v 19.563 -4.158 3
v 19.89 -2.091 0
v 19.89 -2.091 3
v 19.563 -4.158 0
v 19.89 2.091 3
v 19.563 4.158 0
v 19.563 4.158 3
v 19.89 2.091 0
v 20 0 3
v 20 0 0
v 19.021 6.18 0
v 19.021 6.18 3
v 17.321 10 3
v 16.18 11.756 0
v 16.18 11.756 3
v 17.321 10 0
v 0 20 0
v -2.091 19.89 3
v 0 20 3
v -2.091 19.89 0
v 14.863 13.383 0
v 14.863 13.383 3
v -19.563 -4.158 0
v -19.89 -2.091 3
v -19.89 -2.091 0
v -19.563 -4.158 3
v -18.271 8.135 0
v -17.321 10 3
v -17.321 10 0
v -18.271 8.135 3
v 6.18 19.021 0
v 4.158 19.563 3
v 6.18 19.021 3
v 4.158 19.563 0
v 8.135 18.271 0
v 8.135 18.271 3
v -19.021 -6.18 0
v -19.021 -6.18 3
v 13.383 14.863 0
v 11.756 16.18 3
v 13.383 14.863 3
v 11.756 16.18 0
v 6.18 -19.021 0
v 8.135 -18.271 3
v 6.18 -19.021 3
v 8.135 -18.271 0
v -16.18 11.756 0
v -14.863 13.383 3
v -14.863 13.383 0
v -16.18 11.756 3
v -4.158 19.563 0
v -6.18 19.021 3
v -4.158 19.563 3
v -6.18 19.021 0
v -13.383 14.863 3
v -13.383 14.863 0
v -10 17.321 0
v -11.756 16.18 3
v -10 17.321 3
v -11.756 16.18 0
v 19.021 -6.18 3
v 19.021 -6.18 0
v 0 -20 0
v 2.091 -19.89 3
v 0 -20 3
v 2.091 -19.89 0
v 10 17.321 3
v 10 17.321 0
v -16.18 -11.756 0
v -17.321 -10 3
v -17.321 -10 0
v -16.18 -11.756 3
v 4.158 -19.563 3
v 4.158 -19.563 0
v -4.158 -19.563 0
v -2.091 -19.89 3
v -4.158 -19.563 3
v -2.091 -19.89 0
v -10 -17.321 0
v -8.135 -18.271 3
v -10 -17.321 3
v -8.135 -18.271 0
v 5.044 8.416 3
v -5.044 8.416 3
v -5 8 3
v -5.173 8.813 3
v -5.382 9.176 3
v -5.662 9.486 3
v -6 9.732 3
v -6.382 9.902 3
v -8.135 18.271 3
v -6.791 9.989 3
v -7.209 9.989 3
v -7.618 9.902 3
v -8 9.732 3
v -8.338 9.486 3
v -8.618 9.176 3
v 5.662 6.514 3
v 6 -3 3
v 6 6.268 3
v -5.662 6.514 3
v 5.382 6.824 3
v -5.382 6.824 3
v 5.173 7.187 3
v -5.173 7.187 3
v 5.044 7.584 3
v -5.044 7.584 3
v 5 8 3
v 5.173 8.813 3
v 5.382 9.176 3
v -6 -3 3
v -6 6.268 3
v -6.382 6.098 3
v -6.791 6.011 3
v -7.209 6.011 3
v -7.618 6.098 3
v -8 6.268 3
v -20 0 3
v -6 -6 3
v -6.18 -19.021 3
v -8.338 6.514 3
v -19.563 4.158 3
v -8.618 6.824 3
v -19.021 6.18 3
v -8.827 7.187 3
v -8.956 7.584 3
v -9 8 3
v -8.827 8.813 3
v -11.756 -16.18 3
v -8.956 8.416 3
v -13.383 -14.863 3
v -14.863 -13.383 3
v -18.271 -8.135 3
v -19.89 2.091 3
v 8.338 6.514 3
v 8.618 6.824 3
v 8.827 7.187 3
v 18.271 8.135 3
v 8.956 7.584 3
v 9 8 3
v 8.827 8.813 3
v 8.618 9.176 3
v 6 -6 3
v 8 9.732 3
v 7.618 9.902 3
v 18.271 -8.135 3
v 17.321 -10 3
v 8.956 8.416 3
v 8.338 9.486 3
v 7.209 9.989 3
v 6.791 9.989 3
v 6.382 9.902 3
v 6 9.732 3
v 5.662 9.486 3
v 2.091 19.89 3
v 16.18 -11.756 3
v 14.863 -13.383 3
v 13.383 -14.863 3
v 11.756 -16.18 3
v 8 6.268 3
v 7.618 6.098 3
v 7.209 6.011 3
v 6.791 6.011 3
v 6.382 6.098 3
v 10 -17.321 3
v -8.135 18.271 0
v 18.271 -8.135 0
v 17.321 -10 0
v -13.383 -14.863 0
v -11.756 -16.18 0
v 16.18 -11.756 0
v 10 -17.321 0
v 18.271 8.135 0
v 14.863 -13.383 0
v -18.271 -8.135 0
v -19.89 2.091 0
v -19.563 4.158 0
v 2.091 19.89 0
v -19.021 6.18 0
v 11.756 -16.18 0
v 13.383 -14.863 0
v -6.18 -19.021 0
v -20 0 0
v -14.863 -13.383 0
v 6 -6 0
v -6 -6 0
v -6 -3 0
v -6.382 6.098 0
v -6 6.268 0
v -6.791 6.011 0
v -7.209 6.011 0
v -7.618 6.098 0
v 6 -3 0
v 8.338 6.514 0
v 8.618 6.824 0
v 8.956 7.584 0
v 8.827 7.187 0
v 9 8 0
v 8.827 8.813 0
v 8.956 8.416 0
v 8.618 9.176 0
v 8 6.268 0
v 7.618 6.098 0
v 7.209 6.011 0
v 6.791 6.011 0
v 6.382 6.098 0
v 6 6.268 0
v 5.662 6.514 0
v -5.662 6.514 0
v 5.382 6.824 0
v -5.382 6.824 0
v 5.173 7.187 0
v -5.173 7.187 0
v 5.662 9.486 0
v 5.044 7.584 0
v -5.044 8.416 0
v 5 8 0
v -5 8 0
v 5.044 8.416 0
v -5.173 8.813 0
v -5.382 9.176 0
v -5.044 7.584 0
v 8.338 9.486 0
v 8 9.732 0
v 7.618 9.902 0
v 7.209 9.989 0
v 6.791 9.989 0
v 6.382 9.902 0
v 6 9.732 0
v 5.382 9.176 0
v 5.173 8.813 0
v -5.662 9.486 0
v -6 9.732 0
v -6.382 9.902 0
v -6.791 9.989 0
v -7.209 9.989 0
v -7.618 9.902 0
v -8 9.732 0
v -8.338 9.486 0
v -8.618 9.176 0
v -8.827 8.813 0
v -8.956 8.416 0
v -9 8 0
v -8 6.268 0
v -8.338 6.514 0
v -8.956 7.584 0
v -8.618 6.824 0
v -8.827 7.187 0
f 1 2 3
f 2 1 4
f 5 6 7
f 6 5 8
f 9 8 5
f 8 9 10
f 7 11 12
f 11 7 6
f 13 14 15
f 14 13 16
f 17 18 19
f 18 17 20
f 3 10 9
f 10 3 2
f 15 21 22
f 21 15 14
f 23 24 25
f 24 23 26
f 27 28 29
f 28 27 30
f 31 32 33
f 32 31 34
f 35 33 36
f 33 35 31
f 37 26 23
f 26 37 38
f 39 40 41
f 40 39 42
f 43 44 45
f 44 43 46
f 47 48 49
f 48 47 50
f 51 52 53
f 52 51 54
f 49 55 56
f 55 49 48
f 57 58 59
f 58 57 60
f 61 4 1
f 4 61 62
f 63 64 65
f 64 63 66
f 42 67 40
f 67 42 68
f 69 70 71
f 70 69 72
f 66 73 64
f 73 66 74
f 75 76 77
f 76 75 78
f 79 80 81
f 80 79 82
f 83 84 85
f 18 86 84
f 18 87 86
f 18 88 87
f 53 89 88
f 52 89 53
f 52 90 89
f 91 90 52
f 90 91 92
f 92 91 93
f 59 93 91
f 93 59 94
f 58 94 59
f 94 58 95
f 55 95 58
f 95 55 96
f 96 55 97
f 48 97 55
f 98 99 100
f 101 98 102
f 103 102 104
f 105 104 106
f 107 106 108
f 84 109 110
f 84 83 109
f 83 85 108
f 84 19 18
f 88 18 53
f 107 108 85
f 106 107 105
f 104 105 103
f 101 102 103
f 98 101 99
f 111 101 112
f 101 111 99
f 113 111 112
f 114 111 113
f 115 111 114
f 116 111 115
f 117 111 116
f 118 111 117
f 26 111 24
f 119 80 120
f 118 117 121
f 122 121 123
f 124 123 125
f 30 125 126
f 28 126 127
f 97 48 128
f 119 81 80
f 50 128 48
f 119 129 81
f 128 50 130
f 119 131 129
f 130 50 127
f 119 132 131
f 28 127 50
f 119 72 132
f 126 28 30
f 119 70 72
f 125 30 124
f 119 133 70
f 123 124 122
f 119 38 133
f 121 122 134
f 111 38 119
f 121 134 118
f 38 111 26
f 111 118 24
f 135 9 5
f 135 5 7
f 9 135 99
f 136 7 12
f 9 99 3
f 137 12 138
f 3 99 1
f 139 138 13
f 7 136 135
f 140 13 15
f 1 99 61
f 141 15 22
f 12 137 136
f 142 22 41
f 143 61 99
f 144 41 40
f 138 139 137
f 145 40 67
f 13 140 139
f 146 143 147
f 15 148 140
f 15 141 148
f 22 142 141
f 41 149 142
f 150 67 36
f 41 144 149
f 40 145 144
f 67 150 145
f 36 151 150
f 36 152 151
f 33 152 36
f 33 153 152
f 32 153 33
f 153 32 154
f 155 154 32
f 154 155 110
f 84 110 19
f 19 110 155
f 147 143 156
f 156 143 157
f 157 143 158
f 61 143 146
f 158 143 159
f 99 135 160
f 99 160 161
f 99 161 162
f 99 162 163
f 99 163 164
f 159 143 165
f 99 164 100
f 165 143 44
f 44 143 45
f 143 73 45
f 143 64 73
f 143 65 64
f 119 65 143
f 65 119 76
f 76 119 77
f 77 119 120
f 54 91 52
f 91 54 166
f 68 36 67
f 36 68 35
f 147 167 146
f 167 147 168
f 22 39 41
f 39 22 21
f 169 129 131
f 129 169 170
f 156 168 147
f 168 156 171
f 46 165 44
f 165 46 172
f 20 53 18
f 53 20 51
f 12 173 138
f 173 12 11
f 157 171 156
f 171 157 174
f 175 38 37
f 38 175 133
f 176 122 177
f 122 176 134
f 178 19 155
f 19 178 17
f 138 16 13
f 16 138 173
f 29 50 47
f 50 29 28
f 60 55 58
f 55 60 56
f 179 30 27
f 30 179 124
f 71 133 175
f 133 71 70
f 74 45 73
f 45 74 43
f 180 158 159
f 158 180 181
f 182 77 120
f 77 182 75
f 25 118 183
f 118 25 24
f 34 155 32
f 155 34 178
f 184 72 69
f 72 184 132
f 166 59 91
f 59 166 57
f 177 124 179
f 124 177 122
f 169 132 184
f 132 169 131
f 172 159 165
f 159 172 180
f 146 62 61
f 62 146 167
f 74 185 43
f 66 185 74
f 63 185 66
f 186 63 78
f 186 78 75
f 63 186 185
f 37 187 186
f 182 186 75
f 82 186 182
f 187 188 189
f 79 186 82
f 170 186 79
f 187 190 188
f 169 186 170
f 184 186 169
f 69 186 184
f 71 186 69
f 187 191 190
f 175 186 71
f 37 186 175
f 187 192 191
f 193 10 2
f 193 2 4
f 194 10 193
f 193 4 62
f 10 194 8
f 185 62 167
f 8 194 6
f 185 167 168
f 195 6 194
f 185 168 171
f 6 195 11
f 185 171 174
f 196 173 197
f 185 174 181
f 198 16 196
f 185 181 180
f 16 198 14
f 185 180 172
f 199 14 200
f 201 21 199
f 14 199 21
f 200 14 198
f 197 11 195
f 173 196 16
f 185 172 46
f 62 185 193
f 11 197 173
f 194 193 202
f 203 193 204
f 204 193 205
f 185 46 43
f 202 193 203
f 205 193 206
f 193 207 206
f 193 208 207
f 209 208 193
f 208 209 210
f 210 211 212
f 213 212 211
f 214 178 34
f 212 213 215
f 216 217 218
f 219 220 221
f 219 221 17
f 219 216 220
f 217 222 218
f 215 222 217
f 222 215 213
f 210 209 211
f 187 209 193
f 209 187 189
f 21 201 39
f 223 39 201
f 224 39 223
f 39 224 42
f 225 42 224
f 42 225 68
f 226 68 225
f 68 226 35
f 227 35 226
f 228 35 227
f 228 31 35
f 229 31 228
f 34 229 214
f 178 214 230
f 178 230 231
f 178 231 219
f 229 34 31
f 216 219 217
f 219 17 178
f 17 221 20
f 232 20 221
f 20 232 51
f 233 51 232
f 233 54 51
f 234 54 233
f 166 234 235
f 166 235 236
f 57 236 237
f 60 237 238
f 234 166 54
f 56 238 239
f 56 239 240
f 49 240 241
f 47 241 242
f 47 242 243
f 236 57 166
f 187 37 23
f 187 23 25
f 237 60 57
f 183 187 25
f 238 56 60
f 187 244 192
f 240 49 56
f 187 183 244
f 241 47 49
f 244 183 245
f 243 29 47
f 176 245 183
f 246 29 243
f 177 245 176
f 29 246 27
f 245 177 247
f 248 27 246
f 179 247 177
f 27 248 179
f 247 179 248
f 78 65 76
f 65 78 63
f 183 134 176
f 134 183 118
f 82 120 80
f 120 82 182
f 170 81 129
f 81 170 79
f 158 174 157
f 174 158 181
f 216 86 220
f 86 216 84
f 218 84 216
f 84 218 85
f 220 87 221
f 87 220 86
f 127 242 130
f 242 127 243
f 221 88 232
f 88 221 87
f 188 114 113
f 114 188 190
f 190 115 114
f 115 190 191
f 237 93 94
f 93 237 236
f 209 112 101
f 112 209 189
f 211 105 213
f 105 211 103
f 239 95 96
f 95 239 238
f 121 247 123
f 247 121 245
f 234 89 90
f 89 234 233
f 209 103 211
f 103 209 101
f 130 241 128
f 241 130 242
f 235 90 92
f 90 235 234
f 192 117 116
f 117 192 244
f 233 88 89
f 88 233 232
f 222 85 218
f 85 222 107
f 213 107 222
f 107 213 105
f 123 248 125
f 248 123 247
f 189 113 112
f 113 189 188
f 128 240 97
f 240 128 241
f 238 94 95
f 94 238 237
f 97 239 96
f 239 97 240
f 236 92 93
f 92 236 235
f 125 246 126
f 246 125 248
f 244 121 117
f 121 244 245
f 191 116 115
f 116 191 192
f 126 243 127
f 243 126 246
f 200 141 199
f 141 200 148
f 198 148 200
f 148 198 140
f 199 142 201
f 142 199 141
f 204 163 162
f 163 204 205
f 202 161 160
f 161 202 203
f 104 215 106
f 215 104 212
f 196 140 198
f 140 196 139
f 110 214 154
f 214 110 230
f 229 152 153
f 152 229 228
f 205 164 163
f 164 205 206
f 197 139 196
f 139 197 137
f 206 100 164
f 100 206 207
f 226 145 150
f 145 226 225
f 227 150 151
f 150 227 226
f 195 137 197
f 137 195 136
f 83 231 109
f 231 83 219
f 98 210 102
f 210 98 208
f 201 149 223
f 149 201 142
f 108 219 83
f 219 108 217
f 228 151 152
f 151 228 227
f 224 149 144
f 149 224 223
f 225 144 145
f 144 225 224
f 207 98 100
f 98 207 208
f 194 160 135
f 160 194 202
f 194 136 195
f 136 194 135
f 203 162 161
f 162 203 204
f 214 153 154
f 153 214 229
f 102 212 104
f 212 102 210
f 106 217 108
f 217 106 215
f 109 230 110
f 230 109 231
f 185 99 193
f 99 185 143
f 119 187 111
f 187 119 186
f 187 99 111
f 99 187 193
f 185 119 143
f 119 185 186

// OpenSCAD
difference() {
  cylinder(h = 3, r = 20, $fn = 60); // 납작한 얼굴판

  // 왼쪽 눈
  translate([-7, 8, -1])
    cylinder(h = 5, r = 2, $fn = 30);

  // 오른쪽 눈
  translate([7, 8, -1])
    cylinder(h = 5, r = 2, $fn = 30);

  // 입 — 얇고 긴 사각형 하나
  translate([-6, -6, -1])
    cube([12, 3, 10]);
}
